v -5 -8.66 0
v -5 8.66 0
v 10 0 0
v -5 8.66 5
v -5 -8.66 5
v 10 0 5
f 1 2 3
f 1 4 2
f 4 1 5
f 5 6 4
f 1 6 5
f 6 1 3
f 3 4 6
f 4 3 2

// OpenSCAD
$fn = 50;

difference() {
	union() {
		linear_extrude(height = 5) {
			polygon(points = [[10.0, 0.0], [-4.999999999999998, 8.660254037844387], [-5.000000000000004, -8.660254037844386]]);
		}
	}
	union();
}
